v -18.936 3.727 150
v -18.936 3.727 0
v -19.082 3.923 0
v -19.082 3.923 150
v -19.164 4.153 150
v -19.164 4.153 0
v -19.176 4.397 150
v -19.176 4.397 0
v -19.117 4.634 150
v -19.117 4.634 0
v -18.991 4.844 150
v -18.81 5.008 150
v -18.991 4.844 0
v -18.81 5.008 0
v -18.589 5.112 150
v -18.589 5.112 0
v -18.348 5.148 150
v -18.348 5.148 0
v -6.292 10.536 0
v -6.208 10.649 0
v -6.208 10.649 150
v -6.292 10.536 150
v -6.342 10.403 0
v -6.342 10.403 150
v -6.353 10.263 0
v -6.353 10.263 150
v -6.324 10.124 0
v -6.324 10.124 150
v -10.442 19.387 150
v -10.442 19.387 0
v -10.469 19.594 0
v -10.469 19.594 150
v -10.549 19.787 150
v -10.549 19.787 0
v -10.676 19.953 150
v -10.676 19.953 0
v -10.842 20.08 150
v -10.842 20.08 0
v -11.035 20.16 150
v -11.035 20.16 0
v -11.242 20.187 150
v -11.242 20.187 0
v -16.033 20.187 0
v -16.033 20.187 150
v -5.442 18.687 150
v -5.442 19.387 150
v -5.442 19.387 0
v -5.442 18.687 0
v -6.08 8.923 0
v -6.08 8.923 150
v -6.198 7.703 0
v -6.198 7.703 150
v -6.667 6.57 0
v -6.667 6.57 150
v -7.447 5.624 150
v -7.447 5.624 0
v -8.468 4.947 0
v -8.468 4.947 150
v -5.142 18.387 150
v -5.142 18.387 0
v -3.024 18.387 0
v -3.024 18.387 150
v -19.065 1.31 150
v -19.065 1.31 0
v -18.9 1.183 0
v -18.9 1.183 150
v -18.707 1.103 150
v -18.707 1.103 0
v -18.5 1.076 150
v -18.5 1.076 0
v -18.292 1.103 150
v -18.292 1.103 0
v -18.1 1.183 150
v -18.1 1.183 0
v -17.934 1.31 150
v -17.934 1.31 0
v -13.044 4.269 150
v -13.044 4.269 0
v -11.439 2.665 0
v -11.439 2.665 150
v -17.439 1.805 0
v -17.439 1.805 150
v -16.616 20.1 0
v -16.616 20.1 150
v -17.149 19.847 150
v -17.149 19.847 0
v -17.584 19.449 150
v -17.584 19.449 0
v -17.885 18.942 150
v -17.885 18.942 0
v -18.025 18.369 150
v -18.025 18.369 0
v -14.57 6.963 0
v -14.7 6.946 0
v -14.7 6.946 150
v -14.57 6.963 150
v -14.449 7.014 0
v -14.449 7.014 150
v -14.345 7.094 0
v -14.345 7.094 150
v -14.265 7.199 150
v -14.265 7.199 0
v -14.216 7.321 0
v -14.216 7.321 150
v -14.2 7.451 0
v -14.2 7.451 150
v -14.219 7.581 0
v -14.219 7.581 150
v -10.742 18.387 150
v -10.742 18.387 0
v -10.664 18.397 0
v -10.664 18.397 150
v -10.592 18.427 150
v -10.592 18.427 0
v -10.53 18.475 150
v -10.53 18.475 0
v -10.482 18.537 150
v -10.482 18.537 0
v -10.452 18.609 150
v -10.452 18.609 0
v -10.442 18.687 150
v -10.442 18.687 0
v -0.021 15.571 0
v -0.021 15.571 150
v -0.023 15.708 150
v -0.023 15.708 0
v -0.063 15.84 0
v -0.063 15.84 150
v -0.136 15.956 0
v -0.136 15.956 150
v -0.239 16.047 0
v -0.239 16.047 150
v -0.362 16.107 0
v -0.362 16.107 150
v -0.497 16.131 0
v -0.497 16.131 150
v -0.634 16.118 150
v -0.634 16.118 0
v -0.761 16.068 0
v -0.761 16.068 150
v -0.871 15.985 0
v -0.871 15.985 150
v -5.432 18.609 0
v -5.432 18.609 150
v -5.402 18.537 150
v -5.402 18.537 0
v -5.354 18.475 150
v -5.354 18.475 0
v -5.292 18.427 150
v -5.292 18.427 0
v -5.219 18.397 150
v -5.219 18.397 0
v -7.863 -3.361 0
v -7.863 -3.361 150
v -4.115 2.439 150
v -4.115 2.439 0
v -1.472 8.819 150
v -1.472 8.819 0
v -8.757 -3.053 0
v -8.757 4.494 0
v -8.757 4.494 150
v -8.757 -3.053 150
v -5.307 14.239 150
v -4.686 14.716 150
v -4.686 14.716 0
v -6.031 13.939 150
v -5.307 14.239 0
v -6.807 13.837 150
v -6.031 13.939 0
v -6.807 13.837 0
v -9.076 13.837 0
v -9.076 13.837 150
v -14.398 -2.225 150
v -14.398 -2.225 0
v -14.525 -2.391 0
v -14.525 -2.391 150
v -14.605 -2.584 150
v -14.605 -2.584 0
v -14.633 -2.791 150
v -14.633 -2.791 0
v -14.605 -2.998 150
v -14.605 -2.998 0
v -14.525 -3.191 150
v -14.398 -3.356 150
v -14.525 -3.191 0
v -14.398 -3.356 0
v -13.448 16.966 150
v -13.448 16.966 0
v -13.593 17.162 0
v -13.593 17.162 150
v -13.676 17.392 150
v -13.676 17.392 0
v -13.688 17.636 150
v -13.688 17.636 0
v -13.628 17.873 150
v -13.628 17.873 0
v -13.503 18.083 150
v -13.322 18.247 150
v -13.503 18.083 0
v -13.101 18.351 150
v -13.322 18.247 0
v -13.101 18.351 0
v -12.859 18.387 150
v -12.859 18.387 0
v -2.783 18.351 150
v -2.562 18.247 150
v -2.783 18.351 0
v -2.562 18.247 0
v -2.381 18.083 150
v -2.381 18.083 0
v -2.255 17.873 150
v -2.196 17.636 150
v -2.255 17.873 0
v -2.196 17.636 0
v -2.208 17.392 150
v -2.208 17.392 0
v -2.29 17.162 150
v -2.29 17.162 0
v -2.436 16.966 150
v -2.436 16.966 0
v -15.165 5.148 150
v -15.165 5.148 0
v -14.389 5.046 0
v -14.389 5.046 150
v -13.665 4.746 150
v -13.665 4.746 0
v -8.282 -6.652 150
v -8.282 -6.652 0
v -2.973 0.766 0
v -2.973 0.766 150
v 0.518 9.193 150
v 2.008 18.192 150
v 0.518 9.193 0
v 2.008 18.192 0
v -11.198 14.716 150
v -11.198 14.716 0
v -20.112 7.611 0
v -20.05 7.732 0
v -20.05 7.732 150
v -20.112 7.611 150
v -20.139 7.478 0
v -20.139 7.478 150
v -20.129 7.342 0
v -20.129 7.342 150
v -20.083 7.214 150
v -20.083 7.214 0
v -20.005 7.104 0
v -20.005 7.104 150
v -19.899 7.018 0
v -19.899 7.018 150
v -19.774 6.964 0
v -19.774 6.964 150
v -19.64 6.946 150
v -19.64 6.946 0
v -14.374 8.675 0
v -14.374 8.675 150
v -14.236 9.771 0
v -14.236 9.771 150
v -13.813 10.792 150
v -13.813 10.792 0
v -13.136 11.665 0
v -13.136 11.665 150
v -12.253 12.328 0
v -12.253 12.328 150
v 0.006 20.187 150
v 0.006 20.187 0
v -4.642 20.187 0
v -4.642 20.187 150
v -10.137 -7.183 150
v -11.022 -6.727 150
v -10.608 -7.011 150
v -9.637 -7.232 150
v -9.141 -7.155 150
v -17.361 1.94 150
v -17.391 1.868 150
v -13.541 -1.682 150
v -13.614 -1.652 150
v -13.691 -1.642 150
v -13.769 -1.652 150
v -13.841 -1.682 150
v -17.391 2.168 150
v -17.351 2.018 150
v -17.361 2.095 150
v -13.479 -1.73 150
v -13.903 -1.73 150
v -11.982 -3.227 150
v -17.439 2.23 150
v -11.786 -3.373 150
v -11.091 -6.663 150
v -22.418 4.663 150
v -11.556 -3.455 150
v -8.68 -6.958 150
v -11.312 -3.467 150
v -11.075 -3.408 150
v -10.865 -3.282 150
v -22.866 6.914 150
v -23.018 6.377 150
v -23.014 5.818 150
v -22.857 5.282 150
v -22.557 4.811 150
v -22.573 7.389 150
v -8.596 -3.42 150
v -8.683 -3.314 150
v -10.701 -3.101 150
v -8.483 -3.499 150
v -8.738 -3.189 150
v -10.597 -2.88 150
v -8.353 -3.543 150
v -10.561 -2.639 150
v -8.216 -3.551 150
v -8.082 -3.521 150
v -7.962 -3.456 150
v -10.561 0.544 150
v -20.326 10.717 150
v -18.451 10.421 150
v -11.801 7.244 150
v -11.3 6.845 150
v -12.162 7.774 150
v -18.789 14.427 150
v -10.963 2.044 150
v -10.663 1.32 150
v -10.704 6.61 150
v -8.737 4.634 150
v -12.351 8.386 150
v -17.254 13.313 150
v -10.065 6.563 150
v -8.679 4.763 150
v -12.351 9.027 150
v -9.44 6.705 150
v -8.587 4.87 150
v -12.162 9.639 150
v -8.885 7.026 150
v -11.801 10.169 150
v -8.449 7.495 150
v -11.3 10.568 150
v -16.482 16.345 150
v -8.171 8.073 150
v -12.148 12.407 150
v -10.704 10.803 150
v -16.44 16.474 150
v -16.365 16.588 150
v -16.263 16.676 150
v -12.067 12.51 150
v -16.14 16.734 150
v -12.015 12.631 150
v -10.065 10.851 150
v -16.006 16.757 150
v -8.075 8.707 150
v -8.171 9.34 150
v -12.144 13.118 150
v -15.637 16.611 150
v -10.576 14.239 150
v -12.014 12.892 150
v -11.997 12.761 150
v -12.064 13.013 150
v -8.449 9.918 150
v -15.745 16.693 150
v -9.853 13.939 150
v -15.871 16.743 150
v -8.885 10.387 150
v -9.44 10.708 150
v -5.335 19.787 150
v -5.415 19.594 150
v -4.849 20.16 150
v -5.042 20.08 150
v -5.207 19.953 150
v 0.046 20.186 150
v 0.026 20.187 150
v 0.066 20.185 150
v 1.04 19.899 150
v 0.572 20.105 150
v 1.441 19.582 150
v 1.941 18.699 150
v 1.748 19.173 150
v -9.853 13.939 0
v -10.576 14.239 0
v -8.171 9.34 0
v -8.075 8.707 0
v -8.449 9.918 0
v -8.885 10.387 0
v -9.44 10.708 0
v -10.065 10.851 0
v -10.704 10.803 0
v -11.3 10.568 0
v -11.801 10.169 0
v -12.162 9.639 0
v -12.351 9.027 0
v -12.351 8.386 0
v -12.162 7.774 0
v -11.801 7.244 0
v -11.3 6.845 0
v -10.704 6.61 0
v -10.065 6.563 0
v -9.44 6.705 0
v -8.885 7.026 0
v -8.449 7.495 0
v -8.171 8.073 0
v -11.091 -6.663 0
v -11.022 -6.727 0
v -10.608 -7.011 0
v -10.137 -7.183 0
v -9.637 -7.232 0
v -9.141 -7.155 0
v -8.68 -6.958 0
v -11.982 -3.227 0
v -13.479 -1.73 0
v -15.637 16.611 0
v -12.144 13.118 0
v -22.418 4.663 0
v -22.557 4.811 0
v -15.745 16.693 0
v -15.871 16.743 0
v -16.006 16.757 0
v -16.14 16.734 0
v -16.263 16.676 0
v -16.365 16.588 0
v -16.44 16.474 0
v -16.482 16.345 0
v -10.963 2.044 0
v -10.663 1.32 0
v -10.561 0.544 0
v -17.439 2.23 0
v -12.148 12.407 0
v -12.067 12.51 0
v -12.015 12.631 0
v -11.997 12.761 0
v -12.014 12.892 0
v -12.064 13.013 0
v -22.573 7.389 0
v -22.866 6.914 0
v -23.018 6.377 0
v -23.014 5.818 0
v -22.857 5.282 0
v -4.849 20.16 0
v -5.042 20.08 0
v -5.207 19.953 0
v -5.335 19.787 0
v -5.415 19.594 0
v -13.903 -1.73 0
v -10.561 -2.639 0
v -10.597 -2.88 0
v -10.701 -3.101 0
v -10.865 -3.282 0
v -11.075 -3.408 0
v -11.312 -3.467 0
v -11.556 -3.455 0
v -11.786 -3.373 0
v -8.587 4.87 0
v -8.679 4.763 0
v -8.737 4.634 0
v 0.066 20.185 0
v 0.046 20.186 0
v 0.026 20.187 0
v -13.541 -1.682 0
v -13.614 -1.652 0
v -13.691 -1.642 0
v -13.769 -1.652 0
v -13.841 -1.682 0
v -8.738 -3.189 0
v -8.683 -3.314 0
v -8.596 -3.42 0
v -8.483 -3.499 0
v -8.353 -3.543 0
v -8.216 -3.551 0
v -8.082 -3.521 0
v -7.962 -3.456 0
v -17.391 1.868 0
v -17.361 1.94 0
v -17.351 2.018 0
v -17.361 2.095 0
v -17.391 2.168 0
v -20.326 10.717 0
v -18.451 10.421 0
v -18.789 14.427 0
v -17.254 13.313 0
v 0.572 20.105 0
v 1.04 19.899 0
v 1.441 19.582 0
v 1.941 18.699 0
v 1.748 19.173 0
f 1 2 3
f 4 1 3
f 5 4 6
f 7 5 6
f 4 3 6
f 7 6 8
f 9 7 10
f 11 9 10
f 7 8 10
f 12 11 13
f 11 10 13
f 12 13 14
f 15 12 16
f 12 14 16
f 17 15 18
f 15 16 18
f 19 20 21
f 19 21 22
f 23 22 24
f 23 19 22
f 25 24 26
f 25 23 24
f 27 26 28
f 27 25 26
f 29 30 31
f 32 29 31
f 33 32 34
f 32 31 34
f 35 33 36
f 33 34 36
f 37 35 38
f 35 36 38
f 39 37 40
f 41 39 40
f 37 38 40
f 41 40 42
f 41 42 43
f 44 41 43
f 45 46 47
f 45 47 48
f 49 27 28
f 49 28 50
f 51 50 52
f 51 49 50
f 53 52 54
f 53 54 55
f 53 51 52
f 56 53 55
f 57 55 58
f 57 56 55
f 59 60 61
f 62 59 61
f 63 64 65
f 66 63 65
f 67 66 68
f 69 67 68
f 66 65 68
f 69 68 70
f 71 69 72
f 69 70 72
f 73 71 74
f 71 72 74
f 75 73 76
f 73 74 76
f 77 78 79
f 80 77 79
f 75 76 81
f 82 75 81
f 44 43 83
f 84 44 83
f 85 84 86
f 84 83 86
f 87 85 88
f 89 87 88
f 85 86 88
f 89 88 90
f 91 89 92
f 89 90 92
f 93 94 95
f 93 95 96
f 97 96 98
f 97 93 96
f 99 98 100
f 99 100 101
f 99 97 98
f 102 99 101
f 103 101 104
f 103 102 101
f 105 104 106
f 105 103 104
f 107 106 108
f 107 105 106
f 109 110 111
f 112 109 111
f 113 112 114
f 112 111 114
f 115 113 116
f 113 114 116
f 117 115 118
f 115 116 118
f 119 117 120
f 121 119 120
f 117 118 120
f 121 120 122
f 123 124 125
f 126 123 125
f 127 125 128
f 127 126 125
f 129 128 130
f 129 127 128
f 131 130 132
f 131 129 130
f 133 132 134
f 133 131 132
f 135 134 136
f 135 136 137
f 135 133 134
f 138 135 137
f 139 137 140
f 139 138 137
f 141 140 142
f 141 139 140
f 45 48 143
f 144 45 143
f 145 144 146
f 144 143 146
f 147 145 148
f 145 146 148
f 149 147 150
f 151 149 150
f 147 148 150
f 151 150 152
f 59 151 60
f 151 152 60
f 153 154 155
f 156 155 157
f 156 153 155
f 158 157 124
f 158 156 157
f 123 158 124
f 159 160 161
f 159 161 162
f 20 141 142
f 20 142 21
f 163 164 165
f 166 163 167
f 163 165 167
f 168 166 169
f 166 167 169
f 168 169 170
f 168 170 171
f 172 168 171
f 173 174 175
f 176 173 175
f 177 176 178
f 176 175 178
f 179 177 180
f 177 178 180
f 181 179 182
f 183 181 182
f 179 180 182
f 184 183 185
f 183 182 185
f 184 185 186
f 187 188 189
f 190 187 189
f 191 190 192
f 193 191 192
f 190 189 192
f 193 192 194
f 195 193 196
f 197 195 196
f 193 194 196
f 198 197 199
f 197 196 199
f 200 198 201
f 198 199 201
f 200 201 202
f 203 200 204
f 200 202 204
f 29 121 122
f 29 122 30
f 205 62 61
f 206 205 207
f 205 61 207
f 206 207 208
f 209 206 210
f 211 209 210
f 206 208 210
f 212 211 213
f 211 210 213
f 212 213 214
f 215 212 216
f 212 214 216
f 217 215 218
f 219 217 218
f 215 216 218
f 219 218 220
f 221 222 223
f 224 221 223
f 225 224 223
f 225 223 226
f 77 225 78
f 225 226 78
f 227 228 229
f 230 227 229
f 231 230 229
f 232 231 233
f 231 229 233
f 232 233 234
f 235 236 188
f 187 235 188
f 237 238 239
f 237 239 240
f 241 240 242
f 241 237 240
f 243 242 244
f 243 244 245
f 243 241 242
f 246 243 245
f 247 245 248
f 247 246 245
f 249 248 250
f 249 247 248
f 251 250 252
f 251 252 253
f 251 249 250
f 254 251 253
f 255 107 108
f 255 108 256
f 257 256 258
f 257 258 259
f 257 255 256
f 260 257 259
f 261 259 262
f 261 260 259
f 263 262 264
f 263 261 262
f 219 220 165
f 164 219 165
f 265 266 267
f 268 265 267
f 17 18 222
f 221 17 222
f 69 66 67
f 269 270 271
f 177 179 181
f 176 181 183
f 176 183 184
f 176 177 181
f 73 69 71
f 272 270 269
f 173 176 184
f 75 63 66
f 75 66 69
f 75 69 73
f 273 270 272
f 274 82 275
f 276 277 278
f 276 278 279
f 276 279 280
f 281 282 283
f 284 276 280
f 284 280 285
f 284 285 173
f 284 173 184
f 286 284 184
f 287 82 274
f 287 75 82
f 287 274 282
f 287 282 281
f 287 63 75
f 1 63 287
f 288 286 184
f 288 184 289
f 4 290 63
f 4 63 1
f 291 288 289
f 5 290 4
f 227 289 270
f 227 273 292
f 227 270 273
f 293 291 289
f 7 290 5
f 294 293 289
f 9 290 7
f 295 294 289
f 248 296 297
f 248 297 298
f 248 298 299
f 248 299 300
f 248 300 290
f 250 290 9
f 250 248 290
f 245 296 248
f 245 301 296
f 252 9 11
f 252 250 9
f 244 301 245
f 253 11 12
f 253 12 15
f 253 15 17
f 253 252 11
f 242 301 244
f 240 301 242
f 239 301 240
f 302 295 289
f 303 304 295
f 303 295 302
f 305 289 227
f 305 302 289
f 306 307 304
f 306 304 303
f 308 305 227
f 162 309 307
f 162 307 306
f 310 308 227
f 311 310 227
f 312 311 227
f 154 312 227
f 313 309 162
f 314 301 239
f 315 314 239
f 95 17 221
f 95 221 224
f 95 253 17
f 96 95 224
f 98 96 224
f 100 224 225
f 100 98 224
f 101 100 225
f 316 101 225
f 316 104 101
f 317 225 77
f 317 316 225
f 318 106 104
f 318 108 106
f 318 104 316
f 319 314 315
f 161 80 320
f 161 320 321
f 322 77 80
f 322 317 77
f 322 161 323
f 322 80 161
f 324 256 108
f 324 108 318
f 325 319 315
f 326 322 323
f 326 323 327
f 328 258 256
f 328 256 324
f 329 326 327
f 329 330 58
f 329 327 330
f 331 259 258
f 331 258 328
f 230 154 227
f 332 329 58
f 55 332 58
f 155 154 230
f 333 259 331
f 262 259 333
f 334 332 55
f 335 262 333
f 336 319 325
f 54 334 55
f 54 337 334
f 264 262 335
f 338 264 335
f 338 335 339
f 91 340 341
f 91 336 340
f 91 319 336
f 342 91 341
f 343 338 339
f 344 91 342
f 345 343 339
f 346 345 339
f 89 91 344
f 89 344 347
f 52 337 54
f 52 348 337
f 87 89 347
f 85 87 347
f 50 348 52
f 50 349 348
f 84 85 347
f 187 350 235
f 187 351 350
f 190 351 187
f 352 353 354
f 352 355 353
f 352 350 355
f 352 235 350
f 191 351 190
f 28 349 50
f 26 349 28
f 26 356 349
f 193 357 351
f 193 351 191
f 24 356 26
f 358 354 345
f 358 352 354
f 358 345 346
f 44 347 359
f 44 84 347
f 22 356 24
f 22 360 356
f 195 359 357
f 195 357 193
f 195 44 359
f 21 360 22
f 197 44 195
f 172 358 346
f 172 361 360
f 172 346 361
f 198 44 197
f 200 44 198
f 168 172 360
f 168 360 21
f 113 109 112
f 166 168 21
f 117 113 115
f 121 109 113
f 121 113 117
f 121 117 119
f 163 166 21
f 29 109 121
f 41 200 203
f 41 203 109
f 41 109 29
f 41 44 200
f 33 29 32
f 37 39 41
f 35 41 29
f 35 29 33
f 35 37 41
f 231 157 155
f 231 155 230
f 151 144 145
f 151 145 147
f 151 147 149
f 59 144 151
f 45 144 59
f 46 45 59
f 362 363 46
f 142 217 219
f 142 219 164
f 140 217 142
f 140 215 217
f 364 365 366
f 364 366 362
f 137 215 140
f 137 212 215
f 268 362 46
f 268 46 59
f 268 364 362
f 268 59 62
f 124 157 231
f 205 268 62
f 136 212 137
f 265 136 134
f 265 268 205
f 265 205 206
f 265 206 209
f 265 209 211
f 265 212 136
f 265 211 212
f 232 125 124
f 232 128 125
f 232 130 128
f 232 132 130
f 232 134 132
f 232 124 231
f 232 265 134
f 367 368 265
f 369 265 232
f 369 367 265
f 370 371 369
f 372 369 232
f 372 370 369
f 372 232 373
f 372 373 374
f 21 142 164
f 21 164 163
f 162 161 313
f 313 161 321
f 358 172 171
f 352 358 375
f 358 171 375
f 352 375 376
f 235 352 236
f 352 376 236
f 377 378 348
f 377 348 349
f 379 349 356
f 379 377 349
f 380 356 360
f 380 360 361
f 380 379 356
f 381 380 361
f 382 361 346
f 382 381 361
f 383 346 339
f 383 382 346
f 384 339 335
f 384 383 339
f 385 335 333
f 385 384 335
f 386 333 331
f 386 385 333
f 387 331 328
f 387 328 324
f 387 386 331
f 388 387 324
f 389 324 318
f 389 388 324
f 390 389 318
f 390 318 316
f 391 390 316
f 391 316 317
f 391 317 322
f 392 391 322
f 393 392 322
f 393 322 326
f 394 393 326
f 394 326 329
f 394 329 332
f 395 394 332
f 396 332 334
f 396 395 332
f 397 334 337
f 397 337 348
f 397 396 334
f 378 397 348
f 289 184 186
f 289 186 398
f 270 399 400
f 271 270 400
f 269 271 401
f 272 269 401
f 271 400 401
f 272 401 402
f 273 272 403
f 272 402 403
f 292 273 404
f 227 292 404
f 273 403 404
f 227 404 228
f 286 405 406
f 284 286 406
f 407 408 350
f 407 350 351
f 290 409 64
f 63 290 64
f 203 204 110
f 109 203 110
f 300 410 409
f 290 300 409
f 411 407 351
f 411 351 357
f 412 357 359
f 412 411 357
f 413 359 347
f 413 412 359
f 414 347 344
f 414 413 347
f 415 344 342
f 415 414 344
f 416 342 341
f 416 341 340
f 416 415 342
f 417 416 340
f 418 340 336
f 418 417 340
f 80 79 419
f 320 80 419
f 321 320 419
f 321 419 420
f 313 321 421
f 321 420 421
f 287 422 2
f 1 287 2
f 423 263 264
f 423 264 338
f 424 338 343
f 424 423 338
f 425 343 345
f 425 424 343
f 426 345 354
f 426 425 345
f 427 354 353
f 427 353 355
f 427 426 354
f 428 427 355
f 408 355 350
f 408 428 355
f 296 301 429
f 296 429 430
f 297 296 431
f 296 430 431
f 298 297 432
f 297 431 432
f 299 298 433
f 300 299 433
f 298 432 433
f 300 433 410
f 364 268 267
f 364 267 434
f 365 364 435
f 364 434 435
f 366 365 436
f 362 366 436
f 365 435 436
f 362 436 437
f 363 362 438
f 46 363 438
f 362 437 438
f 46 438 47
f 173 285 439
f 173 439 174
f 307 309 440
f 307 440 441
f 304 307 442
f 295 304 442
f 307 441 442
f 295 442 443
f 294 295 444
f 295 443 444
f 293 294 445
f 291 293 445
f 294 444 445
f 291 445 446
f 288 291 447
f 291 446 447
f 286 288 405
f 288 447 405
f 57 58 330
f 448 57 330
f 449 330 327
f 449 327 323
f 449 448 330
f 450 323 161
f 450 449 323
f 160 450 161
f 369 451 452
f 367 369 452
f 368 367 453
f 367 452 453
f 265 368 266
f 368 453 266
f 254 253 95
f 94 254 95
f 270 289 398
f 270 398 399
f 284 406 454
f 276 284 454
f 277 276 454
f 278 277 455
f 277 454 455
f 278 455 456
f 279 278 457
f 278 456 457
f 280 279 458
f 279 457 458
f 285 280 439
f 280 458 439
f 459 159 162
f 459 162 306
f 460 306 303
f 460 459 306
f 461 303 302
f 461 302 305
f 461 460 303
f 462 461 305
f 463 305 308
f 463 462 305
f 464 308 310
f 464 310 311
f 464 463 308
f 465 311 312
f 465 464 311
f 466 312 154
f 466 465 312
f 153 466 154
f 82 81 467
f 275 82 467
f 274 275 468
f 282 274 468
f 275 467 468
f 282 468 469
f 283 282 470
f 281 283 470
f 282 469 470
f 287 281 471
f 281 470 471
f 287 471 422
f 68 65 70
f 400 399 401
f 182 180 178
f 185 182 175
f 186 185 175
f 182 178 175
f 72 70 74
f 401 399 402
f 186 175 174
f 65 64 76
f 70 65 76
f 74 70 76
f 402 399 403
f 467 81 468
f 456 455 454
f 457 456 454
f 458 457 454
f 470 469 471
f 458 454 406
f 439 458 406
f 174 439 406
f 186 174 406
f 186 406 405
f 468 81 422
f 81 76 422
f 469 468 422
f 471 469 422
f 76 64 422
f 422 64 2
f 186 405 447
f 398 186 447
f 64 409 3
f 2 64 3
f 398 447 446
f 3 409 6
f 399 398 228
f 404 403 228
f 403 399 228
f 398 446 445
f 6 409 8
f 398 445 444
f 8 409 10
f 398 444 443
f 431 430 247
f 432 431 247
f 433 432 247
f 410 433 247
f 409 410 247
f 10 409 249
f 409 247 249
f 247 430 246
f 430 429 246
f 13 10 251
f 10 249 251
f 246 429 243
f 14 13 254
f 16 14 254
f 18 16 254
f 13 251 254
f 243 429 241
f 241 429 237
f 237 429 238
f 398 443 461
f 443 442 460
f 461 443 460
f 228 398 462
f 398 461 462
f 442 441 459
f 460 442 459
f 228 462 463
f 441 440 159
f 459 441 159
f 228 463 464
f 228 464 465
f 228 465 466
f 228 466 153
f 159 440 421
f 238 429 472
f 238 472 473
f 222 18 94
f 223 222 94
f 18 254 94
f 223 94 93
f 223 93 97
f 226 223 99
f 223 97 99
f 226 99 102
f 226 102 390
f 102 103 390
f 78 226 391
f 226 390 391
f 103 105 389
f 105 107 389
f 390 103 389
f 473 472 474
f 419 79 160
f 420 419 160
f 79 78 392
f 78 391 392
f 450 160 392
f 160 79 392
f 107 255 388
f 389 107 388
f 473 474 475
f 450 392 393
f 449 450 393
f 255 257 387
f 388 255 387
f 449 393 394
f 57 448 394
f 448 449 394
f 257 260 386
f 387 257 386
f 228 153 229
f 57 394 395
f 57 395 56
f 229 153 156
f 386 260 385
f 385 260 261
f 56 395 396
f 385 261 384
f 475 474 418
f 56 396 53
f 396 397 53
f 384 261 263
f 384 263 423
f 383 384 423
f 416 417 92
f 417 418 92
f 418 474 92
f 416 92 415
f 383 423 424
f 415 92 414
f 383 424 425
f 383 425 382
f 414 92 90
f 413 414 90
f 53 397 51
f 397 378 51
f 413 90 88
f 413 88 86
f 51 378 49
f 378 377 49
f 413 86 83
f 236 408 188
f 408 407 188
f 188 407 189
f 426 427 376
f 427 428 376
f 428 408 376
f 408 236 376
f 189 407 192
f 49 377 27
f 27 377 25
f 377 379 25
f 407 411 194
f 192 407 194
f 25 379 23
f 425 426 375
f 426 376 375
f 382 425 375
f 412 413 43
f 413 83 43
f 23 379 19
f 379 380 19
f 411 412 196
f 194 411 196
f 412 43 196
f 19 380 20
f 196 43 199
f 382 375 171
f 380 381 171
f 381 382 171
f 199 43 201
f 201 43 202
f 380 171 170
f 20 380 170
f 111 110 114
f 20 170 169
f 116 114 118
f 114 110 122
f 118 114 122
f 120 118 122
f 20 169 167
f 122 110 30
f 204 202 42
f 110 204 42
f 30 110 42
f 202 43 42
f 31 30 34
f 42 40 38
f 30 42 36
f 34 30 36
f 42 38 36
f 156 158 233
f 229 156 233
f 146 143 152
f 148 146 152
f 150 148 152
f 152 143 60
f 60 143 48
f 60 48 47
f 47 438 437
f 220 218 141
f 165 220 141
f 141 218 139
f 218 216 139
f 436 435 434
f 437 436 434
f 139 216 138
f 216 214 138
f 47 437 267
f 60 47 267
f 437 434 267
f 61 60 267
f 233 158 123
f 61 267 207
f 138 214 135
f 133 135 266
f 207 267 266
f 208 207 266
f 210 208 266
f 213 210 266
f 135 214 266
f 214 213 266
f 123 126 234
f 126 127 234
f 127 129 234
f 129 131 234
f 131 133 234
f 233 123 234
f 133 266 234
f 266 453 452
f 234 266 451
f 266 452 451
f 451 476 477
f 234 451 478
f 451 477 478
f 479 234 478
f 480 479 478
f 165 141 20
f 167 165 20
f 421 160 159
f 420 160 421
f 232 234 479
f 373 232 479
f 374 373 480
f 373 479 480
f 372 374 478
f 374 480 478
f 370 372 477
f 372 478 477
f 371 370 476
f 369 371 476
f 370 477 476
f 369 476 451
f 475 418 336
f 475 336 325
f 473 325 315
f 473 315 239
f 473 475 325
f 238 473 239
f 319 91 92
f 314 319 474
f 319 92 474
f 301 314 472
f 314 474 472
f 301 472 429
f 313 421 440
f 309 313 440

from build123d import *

# Parameters (mm, degrees)
BOSS_EXTRUDE1_DEPTH = 150


with BuildPart() as part:
    # Sketch1 → Boss-Extrude1 (new body)
    with BuildSketch(Plane.XY):
        with BuildLine():
            Line((-17.933849058, 1.310471954), (-17.438874304, 1.805446694))
            ThreePointArc((-17.438874304, 1.805446694), (-17.351006338, 2.017578728), (-17.438874304, 2.229710762))
            Line((-17.438874304, 2.229710762), (-18.936235421, 3.72707188))
            ThreePointArc((-18.936235421, 3.72707188), (-19.116679575, 4.6342259), (-18.347631531, 5.148087374))
            Line((-18.347631531, 5.148087374), (-15.165219907, 5.148087374))
            ThreePointArc((-15.165219907, 5.148087374), (-14.01716961, 4.919725971), (-13.043899564, 4.269407717))
            Line((-13.043899564, 4.269407717), (-11.439379376, 2.66488753))
            ThreePointArc((-11.439379376, 2.66488753), (-10.789061123, 1.691617485), (-10.560699721, 0.54356719))
            Line((-10.560699721, 0.54356719), (-10.560699721, -2.638844434))
            ThreePointArc((-10.560699721, -2.638844434), (-11.074561199, -3.407892483), (-11.981715225, -3.227448328))
            Line((-11.981715225, -3.227448328), (-13.479076343, -1.730087211))
            ThreePointArc((-13.479076343, -1.730087211), (-13.691208377, -1.642219245), (-13.903340412, -1.730087211))
            Line((-13.903340412, -1.730087211), (-14.398315158, -2.225061958))
            ThreePointArc((-14.398315158, -2.225061958), (-14.632629733, -2.790747383), (-14.398315158, -3.356432808))
            Line((-14.398315158, -3.356432808), (-11.091426526, -6.66332144))
            Line((-11.091426526, -6.66332144), (-11.021736276, -6.72655883))
            ThreePointArc((-11.021736276, -6.72655883), (-9.637071865, -7.232037367), (-8.282153045, -6.651521154))
            ThreePointArc((-8.282153045, -6.651521154), (-0.986587883, 4.879678298), (2.008460712, 18.19221058))
            ThreePointArc((2.008460712, 18.19221058), (1.440783284, 19.581695132), (0.06638279, 20.184976381))
            ThreePointArc((0.06638279, 20.184976381), (0.035983891, 20.186304583), (0.00556439, 20.187019567))
            Line((0.00556439, 20.187019567), (-4.64176753, 20.187019567))
            ThreePointArc((-4.64176753, 20.187019567), (-5.207452955, 19.952704992), (-5.44176753, 19.387019567))
            Line((-5.44176753, 19.387019567), (-5.44176754, 18.687019567))
            ThreePointArc((-5.44176754, 18.687019567), (-5.353899574, 18.474887532), (-5.14176754, 18.387019567))
            Line((-5.14176754, 18.387019567), (-3.02417914, 18.387019567))
            ThreePointArc((-3.02417914, 18.387019567), (-2.255131096, 17.873158092), (-2.43557525, 16.966004073))
            Line((-2.43557525, 16.966004073), (-4.68588009, 14.715699233))
            ThreePointArc((-4.68588009, 14.715699233), (-5.659150136, 14.065380979), (-6.807200433, 13.837019576))
            Line((-6.807200433, 13.837019576), (-9.076334643, 13.837019576))
            ThreePointArc((-9.076334643, 13.837019576), (-10.224384938, 14.065380978), (-11.197654983, 14.715699231))
            Line((-11.197654983, 14.715699231), (-13.447959823, 16.966004071))
            ThreePointArc((-13.447959823, 16.966004071), (-13.628403978, 17.873158097), (-12.859355929, 18.387019575))
            Line((-12.859355929, 18.387019575), (-10.741767529, 18.387019575))
            ThreePointArc((-10.741767529, 18.387019575), (-10.529635495, 18.474887541), (-10.441767529, 18.687019575))
            Line((-10.441767529, 18.687019575), (-10.441767529, 19.387019575))
            ThreePointArc((-10.441767529, 19.387019575), (-10.676082104, 19.952705), (-11.241767529, 20.187019575))
            Line((-11.241767529, 20.187019575), (-16.032865229, 20.187019575))
            ThreePointArc((-16.032865229, 20.187019575), (-17.381264954, 19.664117467), (-18.02458362, 18.368837756))
            ThreePointArc((-18.02458362, 18.368837756), (-19.464176878, 12.533350929), (-22.57254303, 7.389092466))
            ThreePointArc((-22.57254303, 7.389092466), (-23.035584519, 6.097289793), (-22.557062201, 4.811141295))
            Line((-22.557062201, 4.811141295), (-22.41767475, 4.662926796))
            Line((-22.41767475, 4.662926796), (-19.065219908, 1.310471954))
            ThreePointArc((-19.065219908, 1.310471954), (-18.499534483, 1.076157379), (-17.933849058, 1.310471954))
        make_face()
        with BuildLine():
            Line((-12.14365631, 13.117817809), (-15.63660261, 16.610764109))
            ThreePointArc((-15.63660261, 16.610764109), (-16.139874769, 16.734268673), (-16.482327269, 16.345343836))
            ThreePointArc((-16.482327269, 16.345343836), (-17.800420542, 11.845449218), (-20.050293851, 7.731510528))
            ThreePointArc((-20.050293851, 7.731510528), (-20.083154751, 7.214348654), (-19.63995668, 6.945812413))
            Line((-19.63995668, 6.945812413), (-14.70018465, 6.945812413))
            ThreePointArc((-14.70018465, 6.945812413), (-14.301543386, 7.144009261), (-14.21893989, 7.581471843))
            ThreePointArc((-14.21893989, 7.581471843), (-14.058708433, 10.295581323), (-12.252843967, 12.328047292))
            ThreePointArc((-12.252843967, 12.328047292), (-12.001920705, 12.695789539), (-12.14365631, 13.117817809))
        make_face(mode=Mode.SUBTRACT)
        with BuildLine():
            Line((-0.870882283, 15.9852679), (-6.207568998, 10.648581185))
            ThreePointArc((-6.207568998, 10.648581185), (-6.342128781, 10.40340459), (-6.323971818, 10.124319975))
            ThreePointArc((-6.323971818, 10.124319975), (-6.390508312, 7.119308828), (-8.468323669, 4.947396666))
            ThreePointArc((-8.468323669, 4.947396666), (-8.678505203, 4.762892953), (-8.7567231, 4.494378786))
            Line((-8.7567231, 4.494378786), (-8.7567231, -3.052835944))
            ThreePointArc((-8.7567231, -3.052835944), (-8.419748711, -3.525511996), (-7.8630325, -3.361069154))
            ThreePointArc((-7.8630325, -3.361069154), (-2.648796205, 5.569440932), (-0.020993808, 15.571287015))
            ThreePointArc((-0.020993808, 15.571287015), (-0.298372973, 16.081223462), (-0.870882283, 15.9852679))
        make_face(mode=Mode.SUBTRACT)
        with BuildLine():
            ThreePointArc((-12.37538155, 8.706516606), (-10.22538155, 6.556516606), (-8.07538155, 8.706516606))
            ThreePointArc((-8.07538155, 8.706516606), (-10.22538155, 10.856516606), (-12.37538155, 8.706516606))
        make_face(mode=Mode.SUBTRACT)
    extrude(amount=BOSS_EXTRUDE1_DEPTH)


solid = part.part
